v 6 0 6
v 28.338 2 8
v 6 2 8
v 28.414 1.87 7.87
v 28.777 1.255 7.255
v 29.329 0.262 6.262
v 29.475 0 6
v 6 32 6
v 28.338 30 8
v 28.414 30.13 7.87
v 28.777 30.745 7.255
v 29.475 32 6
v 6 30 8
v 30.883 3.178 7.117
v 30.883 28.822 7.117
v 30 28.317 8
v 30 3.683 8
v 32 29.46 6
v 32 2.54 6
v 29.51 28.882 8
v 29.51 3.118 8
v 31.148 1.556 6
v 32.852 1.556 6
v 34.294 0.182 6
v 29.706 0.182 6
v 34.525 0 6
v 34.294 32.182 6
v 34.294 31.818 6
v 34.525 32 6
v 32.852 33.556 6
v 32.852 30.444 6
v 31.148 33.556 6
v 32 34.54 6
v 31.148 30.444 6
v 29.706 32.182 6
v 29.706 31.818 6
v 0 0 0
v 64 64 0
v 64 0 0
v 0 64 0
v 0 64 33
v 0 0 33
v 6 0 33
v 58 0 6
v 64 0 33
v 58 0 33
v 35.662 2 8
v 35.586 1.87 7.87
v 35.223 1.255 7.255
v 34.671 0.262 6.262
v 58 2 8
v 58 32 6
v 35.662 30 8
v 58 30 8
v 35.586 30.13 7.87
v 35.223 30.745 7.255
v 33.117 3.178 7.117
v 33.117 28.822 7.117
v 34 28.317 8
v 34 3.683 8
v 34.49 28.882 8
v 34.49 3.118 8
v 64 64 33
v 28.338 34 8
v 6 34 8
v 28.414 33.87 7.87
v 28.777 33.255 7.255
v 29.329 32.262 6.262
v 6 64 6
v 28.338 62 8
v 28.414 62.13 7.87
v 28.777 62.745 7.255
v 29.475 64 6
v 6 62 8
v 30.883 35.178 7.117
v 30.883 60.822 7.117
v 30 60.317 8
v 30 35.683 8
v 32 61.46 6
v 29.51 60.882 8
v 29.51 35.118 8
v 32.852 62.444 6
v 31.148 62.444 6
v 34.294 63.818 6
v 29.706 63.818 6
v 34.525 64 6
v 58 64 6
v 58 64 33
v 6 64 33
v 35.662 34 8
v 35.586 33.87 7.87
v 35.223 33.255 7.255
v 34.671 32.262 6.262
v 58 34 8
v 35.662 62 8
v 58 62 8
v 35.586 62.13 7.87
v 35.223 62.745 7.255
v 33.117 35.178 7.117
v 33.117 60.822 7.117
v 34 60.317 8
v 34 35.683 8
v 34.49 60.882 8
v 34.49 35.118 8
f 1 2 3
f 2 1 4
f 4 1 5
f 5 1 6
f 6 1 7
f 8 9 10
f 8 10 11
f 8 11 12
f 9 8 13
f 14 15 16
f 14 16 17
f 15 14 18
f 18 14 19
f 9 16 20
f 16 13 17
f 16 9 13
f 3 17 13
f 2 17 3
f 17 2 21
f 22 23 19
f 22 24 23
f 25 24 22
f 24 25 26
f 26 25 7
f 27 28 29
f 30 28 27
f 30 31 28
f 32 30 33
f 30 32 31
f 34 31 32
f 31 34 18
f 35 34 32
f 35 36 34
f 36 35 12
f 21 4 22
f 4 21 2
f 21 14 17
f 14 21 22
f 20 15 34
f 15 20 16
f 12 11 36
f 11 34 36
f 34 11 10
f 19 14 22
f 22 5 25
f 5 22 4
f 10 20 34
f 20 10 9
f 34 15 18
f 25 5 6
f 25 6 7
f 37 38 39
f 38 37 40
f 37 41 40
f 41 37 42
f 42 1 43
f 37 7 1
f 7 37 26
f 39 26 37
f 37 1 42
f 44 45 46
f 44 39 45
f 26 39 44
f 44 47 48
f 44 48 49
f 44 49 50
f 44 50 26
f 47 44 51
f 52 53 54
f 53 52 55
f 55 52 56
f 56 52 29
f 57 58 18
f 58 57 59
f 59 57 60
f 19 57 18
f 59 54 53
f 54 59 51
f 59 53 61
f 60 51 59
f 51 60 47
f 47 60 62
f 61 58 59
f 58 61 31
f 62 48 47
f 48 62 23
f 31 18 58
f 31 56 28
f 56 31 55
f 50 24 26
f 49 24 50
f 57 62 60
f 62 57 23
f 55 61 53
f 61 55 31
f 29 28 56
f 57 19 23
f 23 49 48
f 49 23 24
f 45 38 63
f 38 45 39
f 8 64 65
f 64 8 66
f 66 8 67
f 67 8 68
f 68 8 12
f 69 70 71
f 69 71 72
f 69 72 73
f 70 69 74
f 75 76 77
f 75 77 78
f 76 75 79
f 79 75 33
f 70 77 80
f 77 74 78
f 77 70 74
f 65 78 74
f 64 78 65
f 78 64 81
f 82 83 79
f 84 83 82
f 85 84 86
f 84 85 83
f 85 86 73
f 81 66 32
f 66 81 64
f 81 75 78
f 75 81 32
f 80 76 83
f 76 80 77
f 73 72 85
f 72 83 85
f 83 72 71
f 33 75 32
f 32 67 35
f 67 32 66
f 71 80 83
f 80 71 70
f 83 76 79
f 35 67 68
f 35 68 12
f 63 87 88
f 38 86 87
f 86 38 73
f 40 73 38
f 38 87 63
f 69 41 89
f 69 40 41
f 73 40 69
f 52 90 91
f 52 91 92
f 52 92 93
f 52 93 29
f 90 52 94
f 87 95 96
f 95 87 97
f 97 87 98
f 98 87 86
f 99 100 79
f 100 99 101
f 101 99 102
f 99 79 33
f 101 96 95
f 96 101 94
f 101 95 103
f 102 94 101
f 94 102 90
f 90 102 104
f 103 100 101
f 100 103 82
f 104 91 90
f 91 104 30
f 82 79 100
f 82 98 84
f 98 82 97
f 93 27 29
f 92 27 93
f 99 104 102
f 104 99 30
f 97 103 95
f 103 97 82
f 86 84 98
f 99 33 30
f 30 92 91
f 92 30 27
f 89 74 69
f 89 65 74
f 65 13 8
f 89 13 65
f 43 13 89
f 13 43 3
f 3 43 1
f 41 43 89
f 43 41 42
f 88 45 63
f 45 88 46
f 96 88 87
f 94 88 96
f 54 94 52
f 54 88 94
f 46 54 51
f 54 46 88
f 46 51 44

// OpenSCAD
// file: WylochStyleDungeonLibrary.scad
size = 32;
baseheight = 6;
topperheight = 2;
topperrounded = true;
walllength = size;
wallheight = 25 + baseheight + topperheight;
wallwidth = 6;
wallwidththin = 4;

function hypotenuse_ra(side_a, side_b) =
    sqrt(pow(side_a, 2) + pow(side_b, 2));
    
module wsdl_Base(s,bh)
{
    cube([s,s,bh]);
}

module wsdl_Topper(s,bh,th,tr)
{
    if (tr) {
        translate([0,0,bh])
            intersection() {
                difference () {
                        cube([s,s,th]);
                        union () {
                        rotate(a=45, v=[1,0,0])
                            cube([s,th*2,th*2]);
                        translate([0,s,0])
                            rotate(a=45, v=[1,0,0])
                                cube([s,th*2,th*2]);
                        rotate(a=-45, v=[0,1,0])
                            cube([th*2,s,th*2]);
                        translate([s,0,0])
                            rotate(a=-45, v=[0,1,0])
                                cube([th*2,s,th*2]);
                        }
                }
                translate([s/2,s/2,0])
                    cylinder(
                        h=th, 
                        r1=hypotenuse_ra(s/2-1.2, s/2-1.2), 
                        r2=hypotenuse_ra(s/2-th-.8, s/2-th-.8), 
                        center=false, 
                        $fa=.1);
            }    
    }
    else {
        translate([0,0,bh])
            difference() {
                cube([s,s,th]);
                union () {
                rotate(a=45, v=[1,0,0])
                    cube([s,th*2,th*2]);
                translate([0,s,0])
                    rotate(a=45, v=[1,0,0])
                        cube([s,th*2,th*2]);
                rotate(a=-45, v=[0,1,0])
                    cube([th*2,s,th*2]);
                translate([s,0,0])
                    rotate(a=-45, v=[0,1,0])
                        cube([th*2,s,th*2]);
                }
            }    
    }
}

module wsdl_Base_1x1(s,bh,th,tr) 
{
    union () {
        wsdl_Base(s,bh);
        wsdl_Topper(s,bh,th,tr);
    }
}

module wsdl_Base_1x2(s,bh,th,tr)
{
    union () {
        wsdl_Base_1x1(s,bh,th,tr);
        translate([s,0,0])
            wsdl_Base_1x1(s,bh,th,tr);
    }
}
 
module wsdl_Base_2x2(s,bh,th,tr)
{
    union () {
        wsdl_Base_1x2(s,bh,th,tr);
        translate([0,s,0])
            wsdl_Base_1x2(s,bh,th,tr);
    }
}
 
module wsdl_Base_2x4(s,bh,th,tr)
{
    union () {
        wsdl_Base_2x2(s,bh,th,tr);
        translate([s*2,0,0])
            wsdl_Base_2x2(s,bh,th,tr);
    }
}
 
module wsdl_Base_4x4(s,bh,th,tr)
{
    union () {
        wsdl_Base_2x4(s,bh,th,tr);
        translate([0,s*2,0])
            wsdl_Base_2x4(s,bh,th,tr);
    }
}
 
module wsdl_Wall_1(w,l,h)
{
    cube([w,l,h]);   
}

module wsdl_Wall_2(w,l,h)
{
    union() {
        wsdl_Wall_1(w,l,h);
        translate([0,l,0])
            wsdl_Wall_1(w,l,h);
    }
}

module wsdl_Wall_1_Left(w,l,h) 
{
    wsdl_Wall_1(w,l,h);
}

module wsdl_Wall_1_Right(w,l,h) 
{
    translate([(size)-w,0,0])
        wsdl_Wall_1(w,l,h);
}

module wsdl_Wall_1_DoubleRight(w,l,h) 
{
    translate([(size*2)-w,0,0])
        wsdl_Wall_1(w,l,h);
}

module wsdl_Wall_1_Bottom(w,l,h) 
{
rotate(a=-90)
    translate([-w,0,0])
        wsdl_Wall_1(w,l,h);

}

module wsdl_Wall_1_Top(w,l,h) 
{
rotate(a=-90)
    translate([-l,0,0])
        wsdl_Wall_1(w,l,h);

}

module wsdl_Wall_1_Center(w,l,h) 
{
    translate([(size)-w/2,0,0])
        wsdl_Wall_1(w,l,h);
}


module wsdl_Wall_2_Left(w,l,h) 
{
    wsdl_Wall_2(w,l,h);
}

module wsdl_Wall_2_Right(w,l,h) 
{
    translate([(size*2)-w,0,0])
        wsdl_Wall_2(w,l,h);
}

module wsdl_Wall_2_Bottom(w,l,h) 
{
rotate(a=-90)
    translate([-w,0,0])
        wsdl_Wall_2(w,l,h);

}

module wsdl_Wall_2_Top(w,l,h) 
{
rotate(a=-90)
    translate([-l*2,0,0])
        wsdl_Wall_2(w,l,h);

}

module wsdl_Wall_2_Center(w,l,h) 
{
    translate([(size)-w/2,0,0])
        wsdl_Wall_2(w,l,h);
}
// main file
include <WylochStyleDungeonLibrary.scad>; 
 
wsdl_Base_2x2(size,baseheight,topperheight,topperrounded);
wsdl_Wall_2_Left(wallwidth,walllength,wallheight);
wsdl_Wall_2_Right(wallwidth,walllength,wallheight);
